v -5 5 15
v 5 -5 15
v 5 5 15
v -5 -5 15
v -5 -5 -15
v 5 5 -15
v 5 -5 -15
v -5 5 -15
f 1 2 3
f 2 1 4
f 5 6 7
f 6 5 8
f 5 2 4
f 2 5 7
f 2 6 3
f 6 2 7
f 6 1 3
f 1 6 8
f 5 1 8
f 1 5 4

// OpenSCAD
// Auto-generated from tests/data/feature_fixtures_manifest.json
// fixture: box_tall_narrow
// fixture_type: box
// description: Tall narrow box (10x10x30) stressing the plate/box boundary on the tall axis.
$fn = 96;

box_size = [10.000000, 10.000000, 30.000000];
box_origin = [-5.000000, -5.000000, -15.000000];

module through_hole_x(center, diameter, length) {
  translate([box_origin[0] - 0.1, center[1], center[2]])
    rotate(a=90, v=[0, 1, 0]) cylinder(d=diameter, h=length, center=false);
}

module through_hole_y(center, diameter, length) {
  translate([center[0], box_origin[1] - 0.1, center[2]])
    rotate(a=90, v=[-1, 0, 0]) cylinder(d=diameter, h=length, center=false);
}

module through_hole_z(center, diameter, length) {
  translate([center[0], center[1], box_origin[2] - 0.1])
    cylinder(d=diameter, h=length, center=false);
}

difference() {
  translate(box_origin) cube(box_size);
}
